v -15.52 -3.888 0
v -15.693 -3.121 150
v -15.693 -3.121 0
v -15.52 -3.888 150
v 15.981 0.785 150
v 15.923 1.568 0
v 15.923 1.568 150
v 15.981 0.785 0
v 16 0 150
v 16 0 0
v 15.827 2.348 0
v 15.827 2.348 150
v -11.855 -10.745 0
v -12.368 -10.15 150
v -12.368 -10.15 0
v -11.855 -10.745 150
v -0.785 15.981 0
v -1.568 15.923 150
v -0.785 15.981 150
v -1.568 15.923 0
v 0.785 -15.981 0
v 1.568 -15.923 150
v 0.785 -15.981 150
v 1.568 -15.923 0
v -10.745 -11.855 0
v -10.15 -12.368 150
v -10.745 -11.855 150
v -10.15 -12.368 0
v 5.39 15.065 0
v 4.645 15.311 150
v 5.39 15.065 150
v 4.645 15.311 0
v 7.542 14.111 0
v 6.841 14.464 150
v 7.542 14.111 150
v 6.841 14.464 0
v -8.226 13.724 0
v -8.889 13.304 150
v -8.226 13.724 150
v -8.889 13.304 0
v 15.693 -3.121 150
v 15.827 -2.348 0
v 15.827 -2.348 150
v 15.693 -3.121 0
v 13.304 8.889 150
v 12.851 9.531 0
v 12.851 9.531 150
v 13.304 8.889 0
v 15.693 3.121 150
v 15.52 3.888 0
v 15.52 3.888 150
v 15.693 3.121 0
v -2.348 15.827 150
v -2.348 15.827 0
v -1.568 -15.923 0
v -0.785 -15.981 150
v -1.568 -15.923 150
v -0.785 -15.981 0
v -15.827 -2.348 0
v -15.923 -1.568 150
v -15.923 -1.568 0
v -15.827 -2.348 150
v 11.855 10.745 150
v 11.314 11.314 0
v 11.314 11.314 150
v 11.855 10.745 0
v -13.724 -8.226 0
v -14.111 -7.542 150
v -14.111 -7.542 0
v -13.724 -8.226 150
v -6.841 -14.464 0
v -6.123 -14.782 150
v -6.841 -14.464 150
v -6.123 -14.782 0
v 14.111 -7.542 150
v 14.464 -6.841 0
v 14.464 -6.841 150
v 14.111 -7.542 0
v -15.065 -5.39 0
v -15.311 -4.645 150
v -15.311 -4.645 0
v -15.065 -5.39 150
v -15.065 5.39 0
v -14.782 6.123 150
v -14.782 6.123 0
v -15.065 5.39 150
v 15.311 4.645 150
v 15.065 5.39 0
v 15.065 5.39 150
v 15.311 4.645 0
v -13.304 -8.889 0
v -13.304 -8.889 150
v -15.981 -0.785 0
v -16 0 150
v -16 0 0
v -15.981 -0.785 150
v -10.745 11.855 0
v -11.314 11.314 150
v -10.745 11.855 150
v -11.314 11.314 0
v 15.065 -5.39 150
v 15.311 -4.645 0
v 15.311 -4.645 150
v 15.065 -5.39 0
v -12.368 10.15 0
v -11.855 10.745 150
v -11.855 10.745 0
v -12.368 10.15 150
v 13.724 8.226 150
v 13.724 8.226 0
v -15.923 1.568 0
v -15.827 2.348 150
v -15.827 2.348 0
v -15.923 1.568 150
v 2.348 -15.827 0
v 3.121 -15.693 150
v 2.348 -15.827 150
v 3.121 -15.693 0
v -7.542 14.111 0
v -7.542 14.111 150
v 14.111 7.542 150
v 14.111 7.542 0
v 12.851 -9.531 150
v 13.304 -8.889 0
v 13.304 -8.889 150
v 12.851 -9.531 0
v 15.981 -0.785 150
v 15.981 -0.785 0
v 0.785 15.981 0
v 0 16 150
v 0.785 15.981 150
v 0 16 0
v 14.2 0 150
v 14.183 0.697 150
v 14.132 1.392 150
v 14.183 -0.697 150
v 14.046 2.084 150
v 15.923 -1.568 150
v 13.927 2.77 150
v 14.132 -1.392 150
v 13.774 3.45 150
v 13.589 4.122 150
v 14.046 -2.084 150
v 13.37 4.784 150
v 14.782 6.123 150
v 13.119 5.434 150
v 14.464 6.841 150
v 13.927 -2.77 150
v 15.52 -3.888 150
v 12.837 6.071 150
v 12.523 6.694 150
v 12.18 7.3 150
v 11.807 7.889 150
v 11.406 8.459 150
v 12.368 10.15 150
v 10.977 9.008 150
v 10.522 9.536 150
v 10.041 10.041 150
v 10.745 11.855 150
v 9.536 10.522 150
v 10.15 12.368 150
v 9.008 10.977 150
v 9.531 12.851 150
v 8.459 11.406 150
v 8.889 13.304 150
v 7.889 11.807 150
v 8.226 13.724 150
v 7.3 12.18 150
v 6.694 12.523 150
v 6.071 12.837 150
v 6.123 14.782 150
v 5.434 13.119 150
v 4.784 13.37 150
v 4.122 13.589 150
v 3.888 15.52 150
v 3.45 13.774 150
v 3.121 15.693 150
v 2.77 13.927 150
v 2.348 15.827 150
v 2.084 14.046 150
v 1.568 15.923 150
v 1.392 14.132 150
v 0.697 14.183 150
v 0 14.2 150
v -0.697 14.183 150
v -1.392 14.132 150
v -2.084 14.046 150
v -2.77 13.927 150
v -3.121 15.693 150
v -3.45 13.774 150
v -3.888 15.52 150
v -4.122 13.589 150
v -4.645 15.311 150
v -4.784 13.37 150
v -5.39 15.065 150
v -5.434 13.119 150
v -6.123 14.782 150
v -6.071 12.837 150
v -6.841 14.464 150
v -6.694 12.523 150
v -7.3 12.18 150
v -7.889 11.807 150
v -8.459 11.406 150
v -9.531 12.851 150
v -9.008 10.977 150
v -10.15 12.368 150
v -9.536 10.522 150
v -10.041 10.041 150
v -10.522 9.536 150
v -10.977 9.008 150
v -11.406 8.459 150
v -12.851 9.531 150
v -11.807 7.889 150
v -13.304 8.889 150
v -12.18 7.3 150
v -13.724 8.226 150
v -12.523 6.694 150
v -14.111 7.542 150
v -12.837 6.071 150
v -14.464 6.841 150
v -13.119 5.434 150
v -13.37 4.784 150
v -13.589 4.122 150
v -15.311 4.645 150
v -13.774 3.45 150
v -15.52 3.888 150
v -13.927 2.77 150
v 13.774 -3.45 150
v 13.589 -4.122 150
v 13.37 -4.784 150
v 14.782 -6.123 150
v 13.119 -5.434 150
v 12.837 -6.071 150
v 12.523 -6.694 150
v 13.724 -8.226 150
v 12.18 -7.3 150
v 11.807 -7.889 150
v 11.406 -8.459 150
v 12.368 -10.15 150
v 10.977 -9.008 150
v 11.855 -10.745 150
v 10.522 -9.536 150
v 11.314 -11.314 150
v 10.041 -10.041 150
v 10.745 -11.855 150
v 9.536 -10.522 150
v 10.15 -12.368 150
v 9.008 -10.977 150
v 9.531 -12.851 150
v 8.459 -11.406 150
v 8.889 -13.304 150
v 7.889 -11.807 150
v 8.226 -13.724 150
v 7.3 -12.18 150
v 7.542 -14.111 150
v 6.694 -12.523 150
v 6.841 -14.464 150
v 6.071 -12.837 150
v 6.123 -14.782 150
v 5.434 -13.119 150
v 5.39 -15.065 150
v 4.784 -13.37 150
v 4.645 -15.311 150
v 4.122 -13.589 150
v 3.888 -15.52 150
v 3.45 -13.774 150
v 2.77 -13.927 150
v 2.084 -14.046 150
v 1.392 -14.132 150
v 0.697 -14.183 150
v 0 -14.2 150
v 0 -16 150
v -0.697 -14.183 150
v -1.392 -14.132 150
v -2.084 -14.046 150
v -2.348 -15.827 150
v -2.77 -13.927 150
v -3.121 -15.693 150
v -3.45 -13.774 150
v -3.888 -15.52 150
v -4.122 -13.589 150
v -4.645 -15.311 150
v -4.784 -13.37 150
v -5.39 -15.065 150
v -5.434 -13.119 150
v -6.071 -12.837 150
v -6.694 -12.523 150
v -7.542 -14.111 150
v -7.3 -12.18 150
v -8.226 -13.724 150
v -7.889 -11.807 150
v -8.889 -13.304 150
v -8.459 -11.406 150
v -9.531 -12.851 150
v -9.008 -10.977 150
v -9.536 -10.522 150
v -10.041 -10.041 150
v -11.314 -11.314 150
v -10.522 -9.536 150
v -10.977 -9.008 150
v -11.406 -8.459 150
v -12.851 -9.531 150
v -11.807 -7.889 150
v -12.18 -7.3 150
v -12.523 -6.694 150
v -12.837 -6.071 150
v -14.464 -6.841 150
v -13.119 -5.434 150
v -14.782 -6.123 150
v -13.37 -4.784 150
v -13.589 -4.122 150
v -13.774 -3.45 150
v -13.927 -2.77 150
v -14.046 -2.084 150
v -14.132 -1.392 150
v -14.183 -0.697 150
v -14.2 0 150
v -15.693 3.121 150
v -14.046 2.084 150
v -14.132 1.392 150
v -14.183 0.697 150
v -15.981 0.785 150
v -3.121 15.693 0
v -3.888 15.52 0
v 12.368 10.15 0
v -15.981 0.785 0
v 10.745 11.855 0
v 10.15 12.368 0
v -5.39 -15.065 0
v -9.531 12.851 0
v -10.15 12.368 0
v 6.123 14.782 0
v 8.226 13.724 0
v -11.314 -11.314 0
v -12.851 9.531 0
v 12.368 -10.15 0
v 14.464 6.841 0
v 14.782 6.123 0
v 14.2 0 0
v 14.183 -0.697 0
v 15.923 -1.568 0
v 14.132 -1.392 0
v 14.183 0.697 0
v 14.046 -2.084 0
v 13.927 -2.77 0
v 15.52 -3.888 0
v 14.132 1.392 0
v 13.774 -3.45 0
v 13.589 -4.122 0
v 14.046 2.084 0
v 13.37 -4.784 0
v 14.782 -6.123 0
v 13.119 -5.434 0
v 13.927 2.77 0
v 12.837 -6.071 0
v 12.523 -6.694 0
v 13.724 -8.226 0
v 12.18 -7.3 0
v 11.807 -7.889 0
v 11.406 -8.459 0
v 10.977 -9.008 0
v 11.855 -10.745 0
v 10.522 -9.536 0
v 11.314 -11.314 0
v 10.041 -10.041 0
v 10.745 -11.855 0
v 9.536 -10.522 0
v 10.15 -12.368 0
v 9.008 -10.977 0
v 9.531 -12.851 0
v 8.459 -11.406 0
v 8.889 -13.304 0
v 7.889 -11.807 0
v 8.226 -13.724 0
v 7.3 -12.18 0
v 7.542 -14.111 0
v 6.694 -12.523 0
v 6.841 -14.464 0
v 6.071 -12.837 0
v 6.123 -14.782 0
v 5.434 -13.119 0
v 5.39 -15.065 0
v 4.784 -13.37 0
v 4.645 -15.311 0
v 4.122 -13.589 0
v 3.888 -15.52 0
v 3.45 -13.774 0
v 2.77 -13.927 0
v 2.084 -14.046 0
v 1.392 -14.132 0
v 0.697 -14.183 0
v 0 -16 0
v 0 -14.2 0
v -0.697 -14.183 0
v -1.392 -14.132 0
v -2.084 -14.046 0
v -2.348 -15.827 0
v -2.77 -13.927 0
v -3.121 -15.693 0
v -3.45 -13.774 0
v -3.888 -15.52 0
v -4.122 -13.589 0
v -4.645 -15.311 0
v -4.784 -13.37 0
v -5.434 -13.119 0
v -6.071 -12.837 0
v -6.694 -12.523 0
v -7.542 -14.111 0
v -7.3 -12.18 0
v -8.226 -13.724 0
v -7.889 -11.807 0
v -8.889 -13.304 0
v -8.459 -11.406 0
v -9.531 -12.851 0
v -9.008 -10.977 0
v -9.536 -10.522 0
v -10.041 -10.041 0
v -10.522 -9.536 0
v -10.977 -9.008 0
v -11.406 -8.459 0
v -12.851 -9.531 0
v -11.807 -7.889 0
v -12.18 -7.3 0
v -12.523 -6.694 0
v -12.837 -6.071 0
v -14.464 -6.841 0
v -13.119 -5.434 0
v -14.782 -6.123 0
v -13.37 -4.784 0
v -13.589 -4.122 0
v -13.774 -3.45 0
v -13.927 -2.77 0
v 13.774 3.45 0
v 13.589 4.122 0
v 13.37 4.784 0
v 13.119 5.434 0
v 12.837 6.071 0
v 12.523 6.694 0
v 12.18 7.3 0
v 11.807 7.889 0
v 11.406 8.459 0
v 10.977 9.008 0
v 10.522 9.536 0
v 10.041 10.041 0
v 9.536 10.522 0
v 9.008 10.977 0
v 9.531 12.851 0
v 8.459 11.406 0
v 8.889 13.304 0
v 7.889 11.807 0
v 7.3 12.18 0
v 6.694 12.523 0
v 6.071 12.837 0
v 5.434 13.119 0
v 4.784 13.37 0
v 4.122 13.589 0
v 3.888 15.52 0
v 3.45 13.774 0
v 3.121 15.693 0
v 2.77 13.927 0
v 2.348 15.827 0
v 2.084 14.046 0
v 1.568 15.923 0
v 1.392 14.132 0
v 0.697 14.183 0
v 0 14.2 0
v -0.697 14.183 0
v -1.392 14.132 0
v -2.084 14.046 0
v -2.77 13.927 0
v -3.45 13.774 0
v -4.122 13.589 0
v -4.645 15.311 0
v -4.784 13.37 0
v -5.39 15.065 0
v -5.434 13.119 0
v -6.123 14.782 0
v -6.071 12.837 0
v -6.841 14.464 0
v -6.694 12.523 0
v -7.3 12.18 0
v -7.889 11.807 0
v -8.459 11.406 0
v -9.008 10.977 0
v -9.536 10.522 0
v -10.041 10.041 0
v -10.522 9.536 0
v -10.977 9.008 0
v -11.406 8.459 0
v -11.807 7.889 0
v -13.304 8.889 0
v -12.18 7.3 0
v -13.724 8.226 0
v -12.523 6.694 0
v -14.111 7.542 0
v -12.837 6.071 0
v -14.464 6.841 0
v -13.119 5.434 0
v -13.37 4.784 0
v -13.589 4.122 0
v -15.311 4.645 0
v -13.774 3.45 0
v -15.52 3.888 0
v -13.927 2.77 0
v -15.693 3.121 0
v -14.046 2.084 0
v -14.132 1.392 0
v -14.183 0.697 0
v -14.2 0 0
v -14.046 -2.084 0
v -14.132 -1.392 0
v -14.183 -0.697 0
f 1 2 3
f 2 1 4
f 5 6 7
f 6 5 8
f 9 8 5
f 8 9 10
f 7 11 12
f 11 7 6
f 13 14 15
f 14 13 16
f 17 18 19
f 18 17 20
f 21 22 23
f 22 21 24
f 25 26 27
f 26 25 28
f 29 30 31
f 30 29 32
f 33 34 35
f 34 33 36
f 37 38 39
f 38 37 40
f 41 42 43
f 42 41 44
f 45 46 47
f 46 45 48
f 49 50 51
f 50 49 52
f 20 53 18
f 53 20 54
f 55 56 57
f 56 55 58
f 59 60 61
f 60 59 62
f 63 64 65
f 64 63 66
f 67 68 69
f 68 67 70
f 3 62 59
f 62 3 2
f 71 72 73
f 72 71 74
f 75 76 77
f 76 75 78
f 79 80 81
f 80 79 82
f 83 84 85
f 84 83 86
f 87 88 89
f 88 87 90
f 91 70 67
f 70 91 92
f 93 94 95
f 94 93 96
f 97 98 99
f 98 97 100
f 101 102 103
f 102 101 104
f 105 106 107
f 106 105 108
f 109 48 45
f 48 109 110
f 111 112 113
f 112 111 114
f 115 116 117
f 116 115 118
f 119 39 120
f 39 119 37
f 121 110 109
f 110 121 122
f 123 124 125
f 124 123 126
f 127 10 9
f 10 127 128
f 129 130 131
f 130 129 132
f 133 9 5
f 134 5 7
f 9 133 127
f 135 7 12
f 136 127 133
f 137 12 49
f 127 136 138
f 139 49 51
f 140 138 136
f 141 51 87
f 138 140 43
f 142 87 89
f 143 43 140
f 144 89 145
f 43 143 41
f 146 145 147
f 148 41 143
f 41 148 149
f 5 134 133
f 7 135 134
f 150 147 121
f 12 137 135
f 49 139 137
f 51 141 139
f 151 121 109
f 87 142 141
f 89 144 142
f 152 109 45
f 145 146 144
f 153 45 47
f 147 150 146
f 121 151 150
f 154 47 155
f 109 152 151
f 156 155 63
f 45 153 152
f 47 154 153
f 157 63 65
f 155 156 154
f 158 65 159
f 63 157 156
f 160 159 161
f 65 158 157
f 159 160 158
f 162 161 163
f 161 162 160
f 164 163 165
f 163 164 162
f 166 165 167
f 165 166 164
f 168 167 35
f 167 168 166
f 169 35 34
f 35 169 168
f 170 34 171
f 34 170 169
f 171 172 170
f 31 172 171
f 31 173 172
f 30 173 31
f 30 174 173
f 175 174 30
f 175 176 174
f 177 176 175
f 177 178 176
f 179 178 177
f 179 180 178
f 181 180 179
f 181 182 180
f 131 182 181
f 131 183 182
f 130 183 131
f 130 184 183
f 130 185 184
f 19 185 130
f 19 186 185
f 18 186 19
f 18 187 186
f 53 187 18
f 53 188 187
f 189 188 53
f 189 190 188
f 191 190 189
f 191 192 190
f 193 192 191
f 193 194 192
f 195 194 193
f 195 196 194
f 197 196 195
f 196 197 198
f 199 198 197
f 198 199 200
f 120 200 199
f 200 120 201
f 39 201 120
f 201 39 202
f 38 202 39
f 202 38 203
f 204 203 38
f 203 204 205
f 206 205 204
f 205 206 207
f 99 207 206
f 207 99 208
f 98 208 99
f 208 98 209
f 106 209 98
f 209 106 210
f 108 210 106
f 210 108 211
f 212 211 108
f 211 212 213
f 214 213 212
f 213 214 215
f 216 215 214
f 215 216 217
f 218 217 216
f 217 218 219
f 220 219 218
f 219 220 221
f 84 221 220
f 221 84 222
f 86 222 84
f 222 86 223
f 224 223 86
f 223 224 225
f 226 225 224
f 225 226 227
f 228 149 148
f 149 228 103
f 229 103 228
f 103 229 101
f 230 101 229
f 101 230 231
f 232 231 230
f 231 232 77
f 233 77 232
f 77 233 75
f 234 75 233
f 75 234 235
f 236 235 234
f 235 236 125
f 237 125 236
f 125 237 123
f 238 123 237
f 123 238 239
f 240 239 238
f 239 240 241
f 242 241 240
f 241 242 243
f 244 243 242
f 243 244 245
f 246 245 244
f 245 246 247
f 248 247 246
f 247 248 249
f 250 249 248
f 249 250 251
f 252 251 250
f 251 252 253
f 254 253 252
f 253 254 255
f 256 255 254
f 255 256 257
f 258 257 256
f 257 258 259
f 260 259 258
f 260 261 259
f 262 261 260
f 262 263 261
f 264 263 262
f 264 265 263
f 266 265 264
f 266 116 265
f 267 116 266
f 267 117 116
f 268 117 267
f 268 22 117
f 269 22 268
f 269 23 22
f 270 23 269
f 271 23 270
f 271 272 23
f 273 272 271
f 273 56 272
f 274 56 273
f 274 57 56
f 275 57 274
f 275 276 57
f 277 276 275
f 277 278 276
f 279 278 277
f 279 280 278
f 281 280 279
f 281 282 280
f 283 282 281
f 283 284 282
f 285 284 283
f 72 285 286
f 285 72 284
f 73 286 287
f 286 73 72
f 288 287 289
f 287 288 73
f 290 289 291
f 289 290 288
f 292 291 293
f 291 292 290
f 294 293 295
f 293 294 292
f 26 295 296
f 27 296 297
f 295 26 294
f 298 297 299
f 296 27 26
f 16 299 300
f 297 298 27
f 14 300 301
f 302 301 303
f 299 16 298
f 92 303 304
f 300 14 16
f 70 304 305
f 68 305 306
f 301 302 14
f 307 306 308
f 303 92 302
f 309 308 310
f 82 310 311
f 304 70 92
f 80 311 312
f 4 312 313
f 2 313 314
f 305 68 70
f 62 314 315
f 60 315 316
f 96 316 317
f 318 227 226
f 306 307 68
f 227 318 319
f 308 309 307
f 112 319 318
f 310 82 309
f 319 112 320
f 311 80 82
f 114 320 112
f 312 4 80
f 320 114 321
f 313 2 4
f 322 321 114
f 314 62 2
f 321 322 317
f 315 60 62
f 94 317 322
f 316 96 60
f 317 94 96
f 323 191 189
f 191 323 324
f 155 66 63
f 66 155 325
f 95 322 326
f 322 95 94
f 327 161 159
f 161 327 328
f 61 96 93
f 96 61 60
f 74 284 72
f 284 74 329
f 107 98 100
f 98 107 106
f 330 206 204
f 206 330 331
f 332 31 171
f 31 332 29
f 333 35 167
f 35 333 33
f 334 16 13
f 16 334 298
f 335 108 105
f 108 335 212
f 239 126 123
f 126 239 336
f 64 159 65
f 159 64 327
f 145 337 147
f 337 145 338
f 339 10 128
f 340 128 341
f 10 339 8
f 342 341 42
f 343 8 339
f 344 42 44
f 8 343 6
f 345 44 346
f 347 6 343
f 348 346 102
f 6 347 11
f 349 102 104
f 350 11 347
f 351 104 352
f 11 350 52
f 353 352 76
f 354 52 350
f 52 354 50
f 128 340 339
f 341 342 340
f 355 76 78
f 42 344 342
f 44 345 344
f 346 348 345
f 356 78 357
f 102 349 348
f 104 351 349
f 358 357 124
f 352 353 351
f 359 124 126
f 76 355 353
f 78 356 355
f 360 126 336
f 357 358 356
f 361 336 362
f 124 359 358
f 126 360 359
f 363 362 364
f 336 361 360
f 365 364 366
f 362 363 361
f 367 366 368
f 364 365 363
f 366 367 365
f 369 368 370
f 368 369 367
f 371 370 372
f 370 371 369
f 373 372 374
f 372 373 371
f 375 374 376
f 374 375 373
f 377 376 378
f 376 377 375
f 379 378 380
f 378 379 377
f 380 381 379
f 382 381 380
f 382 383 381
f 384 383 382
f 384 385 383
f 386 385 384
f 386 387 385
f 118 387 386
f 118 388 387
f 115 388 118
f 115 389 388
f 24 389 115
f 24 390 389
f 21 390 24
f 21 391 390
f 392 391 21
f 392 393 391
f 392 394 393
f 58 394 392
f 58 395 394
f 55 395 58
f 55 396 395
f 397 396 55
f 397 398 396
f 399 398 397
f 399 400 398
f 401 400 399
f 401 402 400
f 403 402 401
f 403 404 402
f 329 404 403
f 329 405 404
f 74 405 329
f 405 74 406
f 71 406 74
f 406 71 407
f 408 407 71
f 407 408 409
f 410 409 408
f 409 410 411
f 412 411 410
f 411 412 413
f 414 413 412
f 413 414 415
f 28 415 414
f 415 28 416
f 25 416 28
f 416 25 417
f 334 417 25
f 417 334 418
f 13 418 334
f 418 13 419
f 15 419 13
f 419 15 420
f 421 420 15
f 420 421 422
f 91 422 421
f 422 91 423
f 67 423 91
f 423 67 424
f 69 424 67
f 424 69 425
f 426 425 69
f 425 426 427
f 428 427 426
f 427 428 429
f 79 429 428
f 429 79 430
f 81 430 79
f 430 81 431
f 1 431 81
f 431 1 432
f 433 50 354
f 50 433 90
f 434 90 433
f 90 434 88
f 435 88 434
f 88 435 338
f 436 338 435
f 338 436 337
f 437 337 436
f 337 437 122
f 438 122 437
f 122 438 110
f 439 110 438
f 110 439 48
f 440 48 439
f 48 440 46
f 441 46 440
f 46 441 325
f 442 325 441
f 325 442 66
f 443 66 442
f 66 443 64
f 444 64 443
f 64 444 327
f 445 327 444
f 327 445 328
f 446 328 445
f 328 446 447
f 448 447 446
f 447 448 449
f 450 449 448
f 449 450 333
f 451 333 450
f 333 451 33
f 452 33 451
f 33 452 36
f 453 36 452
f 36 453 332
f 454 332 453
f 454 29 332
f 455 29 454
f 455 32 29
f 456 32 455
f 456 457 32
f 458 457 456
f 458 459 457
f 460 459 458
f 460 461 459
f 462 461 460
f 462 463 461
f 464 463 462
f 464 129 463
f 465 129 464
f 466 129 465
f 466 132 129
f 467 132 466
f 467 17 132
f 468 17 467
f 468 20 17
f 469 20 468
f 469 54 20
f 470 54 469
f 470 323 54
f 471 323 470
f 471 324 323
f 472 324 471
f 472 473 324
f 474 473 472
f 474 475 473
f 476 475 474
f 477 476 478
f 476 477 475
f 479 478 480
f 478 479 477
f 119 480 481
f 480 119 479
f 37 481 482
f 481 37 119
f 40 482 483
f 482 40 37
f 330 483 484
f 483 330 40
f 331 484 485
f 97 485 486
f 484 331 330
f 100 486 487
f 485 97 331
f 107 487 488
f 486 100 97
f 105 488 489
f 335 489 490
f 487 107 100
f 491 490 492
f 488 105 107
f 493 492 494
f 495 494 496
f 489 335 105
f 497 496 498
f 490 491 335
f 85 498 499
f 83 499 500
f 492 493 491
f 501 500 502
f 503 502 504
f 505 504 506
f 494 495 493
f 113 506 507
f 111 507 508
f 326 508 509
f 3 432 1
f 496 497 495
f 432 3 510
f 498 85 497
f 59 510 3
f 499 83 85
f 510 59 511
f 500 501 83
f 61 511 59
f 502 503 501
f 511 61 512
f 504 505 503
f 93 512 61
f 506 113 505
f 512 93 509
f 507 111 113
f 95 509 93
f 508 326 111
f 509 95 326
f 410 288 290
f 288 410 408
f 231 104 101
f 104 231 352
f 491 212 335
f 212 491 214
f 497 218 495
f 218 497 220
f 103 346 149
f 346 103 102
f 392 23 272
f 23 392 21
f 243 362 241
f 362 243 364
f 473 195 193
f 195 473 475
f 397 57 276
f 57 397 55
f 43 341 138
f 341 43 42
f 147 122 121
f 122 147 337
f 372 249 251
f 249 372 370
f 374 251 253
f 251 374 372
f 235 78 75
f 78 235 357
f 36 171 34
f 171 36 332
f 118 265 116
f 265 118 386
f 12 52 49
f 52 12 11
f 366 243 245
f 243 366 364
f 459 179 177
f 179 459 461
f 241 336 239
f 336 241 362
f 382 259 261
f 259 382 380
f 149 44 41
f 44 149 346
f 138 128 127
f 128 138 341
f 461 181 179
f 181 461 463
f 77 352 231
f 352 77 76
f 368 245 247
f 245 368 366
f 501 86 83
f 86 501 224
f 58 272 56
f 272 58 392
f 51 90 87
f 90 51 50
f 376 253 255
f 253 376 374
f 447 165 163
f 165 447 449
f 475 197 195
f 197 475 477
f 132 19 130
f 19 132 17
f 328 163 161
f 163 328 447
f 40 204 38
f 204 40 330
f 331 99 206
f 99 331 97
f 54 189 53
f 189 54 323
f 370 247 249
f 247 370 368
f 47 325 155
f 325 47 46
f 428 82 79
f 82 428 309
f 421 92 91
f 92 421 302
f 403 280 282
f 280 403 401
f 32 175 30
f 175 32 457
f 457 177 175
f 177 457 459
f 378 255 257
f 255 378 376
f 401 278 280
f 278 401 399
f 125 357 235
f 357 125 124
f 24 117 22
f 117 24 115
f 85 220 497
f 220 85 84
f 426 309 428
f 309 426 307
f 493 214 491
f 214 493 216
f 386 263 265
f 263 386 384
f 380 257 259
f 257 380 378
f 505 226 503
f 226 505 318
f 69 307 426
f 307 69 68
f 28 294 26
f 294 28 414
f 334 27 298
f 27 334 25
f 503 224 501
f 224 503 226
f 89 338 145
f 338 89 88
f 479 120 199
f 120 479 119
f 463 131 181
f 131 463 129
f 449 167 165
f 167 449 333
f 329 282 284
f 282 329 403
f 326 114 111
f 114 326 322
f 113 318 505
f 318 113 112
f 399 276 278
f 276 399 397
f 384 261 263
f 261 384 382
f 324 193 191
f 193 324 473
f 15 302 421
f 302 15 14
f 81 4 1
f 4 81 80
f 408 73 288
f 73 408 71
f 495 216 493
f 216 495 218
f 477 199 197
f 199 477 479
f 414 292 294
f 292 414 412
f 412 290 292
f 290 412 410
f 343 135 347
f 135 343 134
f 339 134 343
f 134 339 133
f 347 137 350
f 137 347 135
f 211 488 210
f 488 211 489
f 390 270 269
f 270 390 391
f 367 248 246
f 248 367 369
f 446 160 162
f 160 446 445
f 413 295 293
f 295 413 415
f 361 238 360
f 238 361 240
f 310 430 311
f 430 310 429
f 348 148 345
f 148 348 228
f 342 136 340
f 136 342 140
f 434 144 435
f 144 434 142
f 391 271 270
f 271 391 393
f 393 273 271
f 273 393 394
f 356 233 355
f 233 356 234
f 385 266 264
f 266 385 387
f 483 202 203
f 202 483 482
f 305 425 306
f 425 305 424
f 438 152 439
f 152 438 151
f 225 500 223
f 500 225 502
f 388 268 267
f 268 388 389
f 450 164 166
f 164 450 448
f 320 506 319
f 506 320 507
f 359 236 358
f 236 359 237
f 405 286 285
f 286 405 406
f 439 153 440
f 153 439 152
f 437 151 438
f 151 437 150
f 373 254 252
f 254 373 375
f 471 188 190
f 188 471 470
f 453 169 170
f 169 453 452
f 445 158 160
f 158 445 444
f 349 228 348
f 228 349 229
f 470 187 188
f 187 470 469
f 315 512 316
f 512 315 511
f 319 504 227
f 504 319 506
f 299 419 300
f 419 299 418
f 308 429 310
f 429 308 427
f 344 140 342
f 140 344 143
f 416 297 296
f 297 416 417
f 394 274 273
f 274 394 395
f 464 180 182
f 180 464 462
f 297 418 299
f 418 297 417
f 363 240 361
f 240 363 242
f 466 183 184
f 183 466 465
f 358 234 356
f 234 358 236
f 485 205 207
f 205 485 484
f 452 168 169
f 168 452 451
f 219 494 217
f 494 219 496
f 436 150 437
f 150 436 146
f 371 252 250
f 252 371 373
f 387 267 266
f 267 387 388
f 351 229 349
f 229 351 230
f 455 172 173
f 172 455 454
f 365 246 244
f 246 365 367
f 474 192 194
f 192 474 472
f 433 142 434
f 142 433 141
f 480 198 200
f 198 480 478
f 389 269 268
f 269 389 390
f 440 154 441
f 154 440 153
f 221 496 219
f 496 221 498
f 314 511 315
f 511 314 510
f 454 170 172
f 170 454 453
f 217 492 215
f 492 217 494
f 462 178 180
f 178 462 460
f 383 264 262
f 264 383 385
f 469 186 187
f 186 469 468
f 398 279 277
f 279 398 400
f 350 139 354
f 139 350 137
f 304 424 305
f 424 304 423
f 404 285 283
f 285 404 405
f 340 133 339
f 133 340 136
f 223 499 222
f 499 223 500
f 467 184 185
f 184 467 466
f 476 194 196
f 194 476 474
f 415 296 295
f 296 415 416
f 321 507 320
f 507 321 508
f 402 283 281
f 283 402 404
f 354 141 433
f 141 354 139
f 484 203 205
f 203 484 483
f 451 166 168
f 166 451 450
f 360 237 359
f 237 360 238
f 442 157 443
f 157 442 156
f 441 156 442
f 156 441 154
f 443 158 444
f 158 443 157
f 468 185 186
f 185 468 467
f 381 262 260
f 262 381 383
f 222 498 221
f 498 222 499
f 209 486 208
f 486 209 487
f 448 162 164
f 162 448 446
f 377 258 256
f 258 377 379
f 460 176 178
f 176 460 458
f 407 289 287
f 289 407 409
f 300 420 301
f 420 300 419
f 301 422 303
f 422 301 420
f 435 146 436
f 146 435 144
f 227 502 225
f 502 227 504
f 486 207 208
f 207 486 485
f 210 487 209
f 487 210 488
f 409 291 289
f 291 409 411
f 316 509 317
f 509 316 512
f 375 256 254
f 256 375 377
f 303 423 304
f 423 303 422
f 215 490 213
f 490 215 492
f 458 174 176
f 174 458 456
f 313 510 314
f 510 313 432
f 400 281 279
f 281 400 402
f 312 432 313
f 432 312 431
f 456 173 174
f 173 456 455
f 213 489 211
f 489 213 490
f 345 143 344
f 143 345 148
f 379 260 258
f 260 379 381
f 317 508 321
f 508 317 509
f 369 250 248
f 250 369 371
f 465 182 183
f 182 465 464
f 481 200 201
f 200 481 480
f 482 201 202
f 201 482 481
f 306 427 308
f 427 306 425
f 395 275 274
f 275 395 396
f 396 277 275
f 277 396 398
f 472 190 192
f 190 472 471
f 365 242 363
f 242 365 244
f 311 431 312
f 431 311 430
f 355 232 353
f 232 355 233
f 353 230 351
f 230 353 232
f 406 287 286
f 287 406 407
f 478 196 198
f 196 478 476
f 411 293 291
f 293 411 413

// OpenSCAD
$fn = 128;

// HT pipe parameters (approximate for HT 32)
outer_d = 32;          // mm
wall = 1.8;            // mm (typical thin-wall HT)
inner_d = outer_d - 2*wall;
length = 150;          // mm

module ht_pipe(od, id, h) {
    difference() {
        cylinder(d=od, h=h);
        translate([0,0,-0.1]) cylinder(d=id, h=h+0.2);
    }
}

ht_pipe(outer_d, inner_d, length);
